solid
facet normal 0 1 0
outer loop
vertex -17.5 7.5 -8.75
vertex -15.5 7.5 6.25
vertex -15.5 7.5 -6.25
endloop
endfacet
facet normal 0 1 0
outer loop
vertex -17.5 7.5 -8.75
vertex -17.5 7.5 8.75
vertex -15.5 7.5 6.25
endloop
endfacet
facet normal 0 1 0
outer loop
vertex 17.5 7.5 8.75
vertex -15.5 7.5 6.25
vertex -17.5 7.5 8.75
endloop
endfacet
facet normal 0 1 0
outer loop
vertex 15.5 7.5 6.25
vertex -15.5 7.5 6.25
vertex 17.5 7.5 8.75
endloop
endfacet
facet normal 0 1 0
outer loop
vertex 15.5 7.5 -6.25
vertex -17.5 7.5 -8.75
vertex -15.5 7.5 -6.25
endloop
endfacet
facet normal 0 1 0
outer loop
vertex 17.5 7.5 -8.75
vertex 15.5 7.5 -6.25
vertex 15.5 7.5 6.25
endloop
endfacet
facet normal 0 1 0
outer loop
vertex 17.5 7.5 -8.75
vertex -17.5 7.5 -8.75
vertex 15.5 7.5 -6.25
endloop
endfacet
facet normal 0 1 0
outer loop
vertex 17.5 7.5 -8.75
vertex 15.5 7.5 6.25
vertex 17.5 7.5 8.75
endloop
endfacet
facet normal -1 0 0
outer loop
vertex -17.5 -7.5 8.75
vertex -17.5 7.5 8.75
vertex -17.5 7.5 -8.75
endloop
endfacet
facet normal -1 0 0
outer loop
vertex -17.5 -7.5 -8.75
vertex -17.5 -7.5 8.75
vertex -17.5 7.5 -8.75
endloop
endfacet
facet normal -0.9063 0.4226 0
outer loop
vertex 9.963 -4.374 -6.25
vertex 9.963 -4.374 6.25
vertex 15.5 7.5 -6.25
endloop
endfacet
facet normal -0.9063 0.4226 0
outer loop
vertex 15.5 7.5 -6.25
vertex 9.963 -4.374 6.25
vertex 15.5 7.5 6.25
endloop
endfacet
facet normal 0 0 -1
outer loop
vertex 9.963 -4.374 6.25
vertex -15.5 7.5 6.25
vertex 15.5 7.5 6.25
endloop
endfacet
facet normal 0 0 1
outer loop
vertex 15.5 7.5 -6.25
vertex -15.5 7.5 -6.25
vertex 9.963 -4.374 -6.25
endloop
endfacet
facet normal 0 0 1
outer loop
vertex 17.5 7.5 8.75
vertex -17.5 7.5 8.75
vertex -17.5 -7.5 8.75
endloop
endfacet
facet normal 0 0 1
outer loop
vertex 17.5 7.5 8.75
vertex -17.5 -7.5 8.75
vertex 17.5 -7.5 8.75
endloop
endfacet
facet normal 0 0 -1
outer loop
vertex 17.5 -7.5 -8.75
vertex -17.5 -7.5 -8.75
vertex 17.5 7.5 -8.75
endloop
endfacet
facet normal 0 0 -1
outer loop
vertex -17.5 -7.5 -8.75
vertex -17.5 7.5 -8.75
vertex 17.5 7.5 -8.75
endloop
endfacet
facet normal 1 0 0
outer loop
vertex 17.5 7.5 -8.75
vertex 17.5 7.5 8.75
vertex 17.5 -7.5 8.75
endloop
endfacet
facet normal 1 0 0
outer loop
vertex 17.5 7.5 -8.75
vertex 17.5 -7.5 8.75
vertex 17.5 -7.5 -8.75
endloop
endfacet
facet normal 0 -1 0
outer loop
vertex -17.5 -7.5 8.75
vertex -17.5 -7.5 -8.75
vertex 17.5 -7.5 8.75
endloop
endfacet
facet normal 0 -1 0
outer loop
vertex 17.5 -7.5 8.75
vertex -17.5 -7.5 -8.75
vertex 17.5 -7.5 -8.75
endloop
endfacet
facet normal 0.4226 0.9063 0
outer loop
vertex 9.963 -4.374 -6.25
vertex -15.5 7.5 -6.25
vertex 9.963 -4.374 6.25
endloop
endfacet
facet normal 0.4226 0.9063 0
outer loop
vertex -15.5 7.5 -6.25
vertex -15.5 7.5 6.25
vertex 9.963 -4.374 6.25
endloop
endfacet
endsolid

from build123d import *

# Parameters (mm, degrees)
SKETCH1_W           = 35
SKETCH1_H           = 17.5
BOSS_EXTRUDE2_DEPTH = 7.5
CUT_EXTRUDE2_DEPTH  = 6.25


with BuildPart() as part:
    # Sketch1 → Boss-Extrude2 (new, symmetric)
    with BuildSketch(Plane(origin=(0, 0, 0), x_dir=(1, 0, 0), z_dir=(0, 1, 0))):
        Rectangle(SKETCH1_W, SKETCH1_H)
    extrude(amount=BOSS_EXTRUDE2_DEPTH, both=True)

    # Sketch5 → Cut-Extrude2 (cut, symmetric)
    with BuildSketch(Plane.XY):
        Polygon((-15.5, 7.5), (9.96320795, -4.373688868), (15.5, 7.5), align=None)
    extrude(amount=CUT_EXTRUDE2_DEPTH, both=True, mode=Mode.SUBTRACT)


solid = part.part
